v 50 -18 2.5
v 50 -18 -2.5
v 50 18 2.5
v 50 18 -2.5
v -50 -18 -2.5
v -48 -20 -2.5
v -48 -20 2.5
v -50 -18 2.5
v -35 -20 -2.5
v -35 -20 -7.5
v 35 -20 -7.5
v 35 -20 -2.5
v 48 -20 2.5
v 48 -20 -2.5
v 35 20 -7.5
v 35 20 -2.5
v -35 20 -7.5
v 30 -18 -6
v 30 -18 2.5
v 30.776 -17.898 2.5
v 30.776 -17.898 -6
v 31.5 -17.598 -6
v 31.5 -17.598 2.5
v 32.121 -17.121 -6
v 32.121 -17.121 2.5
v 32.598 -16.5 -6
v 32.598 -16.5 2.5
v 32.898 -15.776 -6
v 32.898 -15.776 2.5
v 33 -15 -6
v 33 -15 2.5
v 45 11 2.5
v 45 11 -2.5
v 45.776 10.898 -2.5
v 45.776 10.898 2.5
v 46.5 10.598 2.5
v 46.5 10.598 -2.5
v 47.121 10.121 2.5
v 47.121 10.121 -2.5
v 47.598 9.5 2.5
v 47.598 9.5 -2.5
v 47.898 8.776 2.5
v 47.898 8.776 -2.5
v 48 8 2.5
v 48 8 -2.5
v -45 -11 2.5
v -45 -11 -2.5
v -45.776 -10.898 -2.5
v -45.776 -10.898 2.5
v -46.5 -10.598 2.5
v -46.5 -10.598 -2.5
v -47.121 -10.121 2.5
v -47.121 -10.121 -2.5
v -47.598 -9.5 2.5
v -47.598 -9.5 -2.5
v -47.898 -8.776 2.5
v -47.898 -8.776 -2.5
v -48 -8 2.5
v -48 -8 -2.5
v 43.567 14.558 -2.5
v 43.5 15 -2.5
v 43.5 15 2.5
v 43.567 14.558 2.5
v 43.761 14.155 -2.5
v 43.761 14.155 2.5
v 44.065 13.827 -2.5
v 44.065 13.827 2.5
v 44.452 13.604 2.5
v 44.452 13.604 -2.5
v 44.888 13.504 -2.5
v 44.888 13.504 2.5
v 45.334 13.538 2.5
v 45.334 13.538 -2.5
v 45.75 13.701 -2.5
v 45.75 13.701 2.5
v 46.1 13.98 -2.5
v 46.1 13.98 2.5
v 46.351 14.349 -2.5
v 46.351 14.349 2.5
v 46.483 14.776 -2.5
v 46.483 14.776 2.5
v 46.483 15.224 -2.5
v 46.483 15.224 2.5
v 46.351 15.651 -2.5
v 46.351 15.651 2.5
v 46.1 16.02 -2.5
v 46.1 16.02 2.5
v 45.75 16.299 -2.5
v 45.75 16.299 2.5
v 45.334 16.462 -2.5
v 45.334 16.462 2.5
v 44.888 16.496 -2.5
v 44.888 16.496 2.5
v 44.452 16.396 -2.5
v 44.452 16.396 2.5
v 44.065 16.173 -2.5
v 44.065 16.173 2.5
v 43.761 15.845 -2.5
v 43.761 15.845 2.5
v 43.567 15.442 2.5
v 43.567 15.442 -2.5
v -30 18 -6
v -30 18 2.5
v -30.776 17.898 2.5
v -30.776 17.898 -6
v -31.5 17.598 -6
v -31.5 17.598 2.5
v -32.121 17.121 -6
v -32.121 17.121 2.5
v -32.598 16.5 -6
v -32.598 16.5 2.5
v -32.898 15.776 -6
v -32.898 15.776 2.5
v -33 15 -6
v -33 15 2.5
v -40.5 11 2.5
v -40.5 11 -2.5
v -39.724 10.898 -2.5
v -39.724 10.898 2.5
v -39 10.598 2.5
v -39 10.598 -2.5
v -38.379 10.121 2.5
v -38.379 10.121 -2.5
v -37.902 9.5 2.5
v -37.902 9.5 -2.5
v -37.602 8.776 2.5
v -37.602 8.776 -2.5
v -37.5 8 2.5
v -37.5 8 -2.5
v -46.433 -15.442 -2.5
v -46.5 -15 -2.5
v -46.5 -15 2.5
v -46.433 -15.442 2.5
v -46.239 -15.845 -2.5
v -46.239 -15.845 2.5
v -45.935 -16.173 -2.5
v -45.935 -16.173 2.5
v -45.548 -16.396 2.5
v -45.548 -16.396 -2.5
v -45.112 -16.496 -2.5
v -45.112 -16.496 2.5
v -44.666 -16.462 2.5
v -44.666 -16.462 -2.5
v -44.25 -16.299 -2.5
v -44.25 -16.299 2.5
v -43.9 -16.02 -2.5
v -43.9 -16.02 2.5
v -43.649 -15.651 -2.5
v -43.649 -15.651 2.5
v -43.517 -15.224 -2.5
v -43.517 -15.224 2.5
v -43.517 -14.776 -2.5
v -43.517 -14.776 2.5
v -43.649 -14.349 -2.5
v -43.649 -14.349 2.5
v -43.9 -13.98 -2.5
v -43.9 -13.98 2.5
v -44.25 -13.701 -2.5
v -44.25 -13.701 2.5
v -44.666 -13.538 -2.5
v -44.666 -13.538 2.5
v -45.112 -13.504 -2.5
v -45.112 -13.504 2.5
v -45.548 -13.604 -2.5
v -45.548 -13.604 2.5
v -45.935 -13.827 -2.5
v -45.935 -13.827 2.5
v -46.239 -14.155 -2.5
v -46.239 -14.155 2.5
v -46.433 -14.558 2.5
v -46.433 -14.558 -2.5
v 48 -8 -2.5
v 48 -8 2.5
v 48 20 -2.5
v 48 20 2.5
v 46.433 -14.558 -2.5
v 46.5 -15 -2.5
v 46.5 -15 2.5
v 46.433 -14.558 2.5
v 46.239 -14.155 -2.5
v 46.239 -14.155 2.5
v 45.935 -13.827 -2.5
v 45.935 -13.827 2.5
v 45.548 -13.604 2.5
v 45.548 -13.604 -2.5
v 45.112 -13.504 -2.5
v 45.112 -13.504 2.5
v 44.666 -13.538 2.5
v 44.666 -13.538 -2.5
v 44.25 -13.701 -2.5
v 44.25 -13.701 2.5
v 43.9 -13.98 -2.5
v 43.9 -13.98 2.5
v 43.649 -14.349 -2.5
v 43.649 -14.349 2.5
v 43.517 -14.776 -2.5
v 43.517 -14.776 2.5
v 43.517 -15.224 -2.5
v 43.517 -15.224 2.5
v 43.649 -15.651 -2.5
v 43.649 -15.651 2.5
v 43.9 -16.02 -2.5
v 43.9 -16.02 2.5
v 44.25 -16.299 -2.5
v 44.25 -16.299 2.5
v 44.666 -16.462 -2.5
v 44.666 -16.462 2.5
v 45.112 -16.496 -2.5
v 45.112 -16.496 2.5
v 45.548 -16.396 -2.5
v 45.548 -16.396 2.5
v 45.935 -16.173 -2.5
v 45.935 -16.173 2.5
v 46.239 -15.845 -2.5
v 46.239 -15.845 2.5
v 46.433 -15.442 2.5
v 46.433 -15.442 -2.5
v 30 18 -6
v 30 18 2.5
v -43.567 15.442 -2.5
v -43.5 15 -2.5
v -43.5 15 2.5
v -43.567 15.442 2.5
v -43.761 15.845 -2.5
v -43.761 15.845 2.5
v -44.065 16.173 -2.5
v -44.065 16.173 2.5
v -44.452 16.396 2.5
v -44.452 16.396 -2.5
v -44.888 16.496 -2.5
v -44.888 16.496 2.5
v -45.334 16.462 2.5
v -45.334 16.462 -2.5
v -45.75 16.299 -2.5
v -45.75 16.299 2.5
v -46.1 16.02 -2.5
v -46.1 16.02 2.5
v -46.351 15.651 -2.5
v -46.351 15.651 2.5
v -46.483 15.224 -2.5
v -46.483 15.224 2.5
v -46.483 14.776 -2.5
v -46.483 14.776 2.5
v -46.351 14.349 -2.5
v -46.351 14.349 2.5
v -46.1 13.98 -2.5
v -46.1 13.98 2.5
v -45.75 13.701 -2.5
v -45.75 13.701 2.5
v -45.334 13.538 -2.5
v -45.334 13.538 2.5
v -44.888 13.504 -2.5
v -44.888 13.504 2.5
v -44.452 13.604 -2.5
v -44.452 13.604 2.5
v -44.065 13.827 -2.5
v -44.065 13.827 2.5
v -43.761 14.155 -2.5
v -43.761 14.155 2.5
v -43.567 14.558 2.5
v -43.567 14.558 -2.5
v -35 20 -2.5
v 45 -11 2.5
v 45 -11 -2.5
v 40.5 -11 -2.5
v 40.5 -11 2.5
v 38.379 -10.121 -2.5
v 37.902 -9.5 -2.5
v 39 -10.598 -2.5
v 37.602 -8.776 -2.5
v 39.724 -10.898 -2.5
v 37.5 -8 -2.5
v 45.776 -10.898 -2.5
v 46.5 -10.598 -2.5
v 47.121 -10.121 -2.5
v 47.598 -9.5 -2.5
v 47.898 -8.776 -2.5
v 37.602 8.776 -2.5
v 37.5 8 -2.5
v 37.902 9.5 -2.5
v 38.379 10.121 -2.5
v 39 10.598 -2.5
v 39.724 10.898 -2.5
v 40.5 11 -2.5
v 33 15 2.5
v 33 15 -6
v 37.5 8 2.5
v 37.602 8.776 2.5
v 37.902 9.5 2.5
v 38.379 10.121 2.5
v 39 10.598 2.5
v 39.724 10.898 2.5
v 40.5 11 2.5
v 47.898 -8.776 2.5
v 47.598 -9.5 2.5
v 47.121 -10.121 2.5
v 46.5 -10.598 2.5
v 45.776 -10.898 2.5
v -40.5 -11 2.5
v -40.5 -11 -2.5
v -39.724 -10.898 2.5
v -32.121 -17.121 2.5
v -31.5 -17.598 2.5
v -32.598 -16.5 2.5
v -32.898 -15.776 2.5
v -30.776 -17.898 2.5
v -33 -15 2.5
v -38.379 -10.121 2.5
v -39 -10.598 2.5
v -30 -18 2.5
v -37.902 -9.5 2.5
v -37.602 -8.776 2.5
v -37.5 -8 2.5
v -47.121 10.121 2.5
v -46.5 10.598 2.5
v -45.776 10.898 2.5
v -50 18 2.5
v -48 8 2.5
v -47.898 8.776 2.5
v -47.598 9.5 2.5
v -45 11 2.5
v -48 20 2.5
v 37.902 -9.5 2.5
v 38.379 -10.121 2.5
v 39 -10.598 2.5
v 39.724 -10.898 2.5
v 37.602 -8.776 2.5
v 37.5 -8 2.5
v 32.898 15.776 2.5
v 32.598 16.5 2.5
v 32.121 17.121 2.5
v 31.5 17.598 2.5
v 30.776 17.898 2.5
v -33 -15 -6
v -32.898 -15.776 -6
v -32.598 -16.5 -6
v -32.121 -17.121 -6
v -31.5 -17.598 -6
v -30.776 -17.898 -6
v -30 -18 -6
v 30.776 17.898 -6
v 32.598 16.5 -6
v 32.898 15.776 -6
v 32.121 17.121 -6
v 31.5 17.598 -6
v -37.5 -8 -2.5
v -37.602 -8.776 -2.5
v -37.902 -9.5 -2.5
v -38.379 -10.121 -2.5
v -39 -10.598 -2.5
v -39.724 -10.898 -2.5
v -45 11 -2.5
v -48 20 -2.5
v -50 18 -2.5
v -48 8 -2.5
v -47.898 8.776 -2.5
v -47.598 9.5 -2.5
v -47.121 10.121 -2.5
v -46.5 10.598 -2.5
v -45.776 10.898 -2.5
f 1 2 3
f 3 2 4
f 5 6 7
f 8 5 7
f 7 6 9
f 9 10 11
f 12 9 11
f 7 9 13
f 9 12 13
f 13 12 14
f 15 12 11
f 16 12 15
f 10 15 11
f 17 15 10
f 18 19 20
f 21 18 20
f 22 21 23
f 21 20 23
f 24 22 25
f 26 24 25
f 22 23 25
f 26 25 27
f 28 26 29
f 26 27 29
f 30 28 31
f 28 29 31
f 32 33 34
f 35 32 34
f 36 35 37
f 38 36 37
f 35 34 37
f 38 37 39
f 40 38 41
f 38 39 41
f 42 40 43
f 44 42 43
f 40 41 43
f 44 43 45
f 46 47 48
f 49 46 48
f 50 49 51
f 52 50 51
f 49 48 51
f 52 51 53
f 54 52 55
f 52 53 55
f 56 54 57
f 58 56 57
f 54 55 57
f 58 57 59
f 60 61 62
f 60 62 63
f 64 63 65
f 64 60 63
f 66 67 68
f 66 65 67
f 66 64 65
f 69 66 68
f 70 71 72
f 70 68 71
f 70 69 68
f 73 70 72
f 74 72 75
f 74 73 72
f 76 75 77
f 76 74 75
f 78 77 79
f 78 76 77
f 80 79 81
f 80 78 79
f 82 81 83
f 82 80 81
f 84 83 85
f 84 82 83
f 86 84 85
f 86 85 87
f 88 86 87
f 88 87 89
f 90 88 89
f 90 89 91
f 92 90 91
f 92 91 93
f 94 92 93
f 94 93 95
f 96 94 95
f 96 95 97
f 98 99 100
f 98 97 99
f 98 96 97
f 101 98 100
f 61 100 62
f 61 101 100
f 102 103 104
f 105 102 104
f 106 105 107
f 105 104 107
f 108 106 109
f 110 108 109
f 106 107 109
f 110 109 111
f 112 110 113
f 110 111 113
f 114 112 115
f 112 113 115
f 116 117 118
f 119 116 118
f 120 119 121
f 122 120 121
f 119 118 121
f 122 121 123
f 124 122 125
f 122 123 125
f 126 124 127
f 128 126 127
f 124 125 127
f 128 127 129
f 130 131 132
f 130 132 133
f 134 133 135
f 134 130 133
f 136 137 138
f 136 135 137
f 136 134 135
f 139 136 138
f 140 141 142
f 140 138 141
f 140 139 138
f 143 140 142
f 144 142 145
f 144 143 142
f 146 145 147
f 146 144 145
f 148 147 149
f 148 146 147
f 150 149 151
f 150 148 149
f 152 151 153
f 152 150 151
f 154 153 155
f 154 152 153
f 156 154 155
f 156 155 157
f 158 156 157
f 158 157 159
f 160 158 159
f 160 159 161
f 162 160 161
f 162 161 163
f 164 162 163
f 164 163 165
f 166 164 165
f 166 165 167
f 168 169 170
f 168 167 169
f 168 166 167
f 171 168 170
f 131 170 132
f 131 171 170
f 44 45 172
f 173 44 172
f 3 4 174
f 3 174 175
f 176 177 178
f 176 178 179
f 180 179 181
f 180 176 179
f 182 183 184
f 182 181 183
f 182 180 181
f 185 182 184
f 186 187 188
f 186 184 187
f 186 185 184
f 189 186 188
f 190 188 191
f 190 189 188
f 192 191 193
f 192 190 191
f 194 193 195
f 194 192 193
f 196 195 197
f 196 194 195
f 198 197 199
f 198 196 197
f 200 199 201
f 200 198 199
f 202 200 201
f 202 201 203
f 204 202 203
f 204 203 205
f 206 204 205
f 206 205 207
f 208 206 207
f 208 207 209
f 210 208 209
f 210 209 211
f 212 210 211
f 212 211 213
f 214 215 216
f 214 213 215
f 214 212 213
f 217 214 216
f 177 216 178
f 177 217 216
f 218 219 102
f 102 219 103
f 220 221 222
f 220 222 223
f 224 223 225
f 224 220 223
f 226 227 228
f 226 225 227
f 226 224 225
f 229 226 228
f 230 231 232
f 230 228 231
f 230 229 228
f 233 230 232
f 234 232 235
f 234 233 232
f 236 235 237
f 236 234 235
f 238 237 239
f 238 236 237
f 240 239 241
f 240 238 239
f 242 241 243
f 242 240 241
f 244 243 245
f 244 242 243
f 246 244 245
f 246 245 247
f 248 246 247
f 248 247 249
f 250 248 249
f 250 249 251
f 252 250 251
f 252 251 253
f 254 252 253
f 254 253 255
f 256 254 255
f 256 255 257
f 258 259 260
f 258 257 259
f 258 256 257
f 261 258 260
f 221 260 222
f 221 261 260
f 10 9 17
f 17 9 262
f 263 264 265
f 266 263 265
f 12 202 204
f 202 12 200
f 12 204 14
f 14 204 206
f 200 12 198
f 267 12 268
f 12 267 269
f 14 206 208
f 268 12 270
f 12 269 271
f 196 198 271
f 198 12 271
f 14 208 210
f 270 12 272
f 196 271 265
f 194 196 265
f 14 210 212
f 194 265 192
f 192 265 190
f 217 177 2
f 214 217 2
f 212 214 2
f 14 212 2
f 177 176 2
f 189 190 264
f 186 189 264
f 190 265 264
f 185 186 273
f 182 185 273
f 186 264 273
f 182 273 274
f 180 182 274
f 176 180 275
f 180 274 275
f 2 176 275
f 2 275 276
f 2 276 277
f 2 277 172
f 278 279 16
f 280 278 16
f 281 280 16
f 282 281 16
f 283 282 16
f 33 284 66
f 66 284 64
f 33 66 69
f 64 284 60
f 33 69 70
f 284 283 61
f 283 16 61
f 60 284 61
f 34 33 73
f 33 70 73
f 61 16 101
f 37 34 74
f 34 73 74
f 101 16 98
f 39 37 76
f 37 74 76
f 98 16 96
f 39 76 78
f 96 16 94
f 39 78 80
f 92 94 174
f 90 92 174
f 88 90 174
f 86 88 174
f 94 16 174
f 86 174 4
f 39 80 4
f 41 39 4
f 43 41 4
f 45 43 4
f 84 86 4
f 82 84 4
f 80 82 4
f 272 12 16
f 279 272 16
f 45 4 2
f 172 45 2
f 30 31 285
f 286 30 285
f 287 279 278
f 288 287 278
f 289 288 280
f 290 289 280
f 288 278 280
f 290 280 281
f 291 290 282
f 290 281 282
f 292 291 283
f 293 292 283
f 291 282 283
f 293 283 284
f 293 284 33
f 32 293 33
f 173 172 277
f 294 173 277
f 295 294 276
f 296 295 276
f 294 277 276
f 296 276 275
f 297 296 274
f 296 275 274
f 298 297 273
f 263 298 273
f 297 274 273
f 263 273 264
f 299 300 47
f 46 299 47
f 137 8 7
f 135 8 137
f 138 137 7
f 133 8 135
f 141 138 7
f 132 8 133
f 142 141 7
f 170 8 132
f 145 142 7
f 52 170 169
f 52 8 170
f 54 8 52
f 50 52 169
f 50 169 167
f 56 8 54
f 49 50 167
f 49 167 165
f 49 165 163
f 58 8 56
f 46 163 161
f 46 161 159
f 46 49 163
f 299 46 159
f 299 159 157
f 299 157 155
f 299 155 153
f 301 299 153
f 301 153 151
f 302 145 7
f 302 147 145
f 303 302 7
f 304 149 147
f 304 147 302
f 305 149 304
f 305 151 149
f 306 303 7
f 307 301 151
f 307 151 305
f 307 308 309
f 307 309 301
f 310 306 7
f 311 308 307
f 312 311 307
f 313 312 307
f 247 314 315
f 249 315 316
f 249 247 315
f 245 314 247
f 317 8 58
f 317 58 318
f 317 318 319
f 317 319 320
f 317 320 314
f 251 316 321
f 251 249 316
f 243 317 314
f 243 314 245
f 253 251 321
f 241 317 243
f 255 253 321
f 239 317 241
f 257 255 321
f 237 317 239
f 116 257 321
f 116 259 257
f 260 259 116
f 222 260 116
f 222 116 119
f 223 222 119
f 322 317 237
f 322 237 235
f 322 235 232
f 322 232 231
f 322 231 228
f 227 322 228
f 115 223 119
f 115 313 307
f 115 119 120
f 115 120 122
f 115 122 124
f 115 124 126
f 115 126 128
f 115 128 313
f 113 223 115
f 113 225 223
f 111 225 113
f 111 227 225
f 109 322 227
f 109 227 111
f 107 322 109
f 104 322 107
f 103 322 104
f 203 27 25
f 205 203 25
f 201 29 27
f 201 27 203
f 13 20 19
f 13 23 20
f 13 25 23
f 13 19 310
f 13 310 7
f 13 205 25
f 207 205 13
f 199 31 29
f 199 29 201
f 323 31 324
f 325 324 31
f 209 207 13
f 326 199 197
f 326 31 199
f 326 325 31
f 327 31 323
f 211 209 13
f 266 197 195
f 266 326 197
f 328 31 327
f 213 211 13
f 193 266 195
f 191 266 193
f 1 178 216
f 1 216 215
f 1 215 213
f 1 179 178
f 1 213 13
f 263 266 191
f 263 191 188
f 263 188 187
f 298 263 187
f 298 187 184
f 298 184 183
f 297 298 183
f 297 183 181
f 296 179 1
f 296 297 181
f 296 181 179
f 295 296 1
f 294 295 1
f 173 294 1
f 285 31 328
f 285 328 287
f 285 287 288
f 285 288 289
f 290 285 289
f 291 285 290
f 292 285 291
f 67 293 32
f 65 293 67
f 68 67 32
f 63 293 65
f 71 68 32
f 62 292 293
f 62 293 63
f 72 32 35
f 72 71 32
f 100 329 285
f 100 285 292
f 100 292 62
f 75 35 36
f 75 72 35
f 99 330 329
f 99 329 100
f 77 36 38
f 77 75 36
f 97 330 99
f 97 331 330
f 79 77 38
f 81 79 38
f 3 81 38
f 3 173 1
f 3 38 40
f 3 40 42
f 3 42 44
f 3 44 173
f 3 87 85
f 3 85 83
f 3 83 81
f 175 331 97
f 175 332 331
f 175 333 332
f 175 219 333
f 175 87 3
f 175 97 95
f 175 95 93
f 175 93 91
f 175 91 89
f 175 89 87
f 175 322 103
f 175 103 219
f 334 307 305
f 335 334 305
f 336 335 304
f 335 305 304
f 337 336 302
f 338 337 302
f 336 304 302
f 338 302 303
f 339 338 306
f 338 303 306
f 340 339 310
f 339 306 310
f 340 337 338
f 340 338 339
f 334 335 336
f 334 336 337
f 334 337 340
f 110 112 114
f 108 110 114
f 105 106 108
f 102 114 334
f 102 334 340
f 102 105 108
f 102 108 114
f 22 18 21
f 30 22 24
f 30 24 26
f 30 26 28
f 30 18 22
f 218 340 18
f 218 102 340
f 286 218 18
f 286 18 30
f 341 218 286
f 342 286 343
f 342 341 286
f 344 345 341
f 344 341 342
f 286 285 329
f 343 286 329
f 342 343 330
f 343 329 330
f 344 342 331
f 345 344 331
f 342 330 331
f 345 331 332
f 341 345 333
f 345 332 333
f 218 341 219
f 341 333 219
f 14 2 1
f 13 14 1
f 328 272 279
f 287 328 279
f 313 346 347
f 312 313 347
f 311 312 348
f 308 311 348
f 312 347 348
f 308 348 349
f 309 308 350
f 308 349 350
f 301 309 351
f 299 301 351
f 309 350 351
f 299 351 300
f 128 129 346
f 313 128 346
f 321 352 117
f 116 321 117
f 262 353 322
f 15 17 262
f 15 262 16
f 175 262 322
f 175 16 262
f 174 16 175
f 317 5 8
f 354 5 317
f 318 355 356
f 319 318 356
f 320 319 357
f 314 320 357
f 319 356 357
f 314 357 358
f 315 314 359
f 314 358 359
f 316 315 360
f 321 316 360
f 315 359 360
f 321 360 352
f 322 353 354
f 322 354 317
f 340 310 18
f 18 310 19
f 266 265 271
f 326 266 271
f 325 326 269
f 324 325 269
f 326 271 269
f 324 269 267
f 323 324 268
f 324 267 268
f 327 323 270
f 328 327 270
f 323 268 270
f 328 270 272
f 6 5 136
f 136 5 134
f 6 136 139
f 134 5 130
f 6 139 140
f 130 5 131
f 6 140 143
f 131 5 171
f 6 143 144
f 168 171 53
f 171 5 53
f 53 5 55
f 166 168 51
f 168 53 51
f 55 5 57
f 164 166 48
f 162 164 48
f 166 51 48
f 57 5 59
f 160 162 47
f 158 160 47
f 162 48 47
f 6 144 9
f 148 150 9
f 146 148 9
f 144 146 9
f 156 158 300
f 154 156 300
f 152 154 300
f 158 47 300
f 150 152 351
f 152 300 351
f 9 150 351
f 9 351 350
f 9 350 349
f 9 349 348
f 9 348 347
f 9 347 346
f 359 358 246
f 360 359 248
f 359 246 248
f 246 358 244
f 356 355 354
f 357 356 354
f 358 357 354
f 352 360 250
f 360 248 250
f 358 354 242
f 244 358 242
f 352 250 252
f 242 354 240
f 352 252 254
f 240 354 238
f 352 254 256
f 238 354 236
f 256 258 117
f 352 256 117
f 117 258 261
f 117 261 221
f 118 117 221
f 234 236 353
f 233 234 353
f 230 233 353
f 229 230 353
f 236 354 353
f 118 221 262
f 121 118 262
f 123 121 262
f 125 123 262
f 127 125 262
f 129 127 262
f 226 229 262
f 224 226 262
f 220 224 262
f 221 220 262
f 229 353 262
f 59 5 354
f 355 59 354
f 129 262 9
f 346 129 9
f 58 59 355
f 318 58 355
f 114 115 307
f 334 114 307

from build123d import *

# Parameters (mm, degrees)
AUFSATZ_LINEAR_AUSTRAGEN1_DEPTH      = 2.5
AUFSATZ_LINEAR_AUSTRAGEN1_DEPTH_BACK = 2.5
SKIZZE1_W                            = 100
SKIZZE1_H                            = 40
SCHNITT_LINEAR_AUSTRAGEN1_DEPTH      = 54.909646632
SCHNITT_LINEAR_AUSTRAGEN1_DEPTH_BACK = 54.909646632
SKIZZE2_R                            = 1.5
SCHNITT_LINEAR_AUSTRAGEN2_DEPTH      = 54.909646632
SCHNITT_LINEAR_AUSTRAGEN2_DEPTH_BACK = 54.909646632
SKIZZE7_W                            = 70
SKIZZE7_H                            = 40
AUFSATZ_LINEAR_AUSTRAGEN3_DEPTH      = 5
SCHNITT_LINEAR_AUSTRAGEN6_DEPTH      = 8.5
FASE1_SIZE                           = 2


with BuildPart() as part:
    # Skizze1 → Aufsatz-Linear austragen1 (new, two sides: drawn at the far end of the back side and taken through both)
    with BuildSketch(Plane.XY.offset(-AUFSATZ_LINEAR_AUSTRAGEN1_DEPTH_BACK)):
        Rectangle(SKIZZE1_W, SKIZZE1_H)
    extrude(amount=AUFSATZ_LINEAR_AUSTRAGEN1_DEPTH + AUFSATZ_LINEAR_AUSTRAGEN1_DEPTH_BACK)

    # Skizze2 → Schnitt-Linear austragen1 (cut, two sides: drawn at the far end of the back side and taken through both)
    with BuildSketch(Plane.XY.offset(-SCHNITT_LINEAR_AUSTRAGEN1_DEPTH_BACK)):
        with Locations((-45, 15)):
            Circle(SKIZZE2_R)
        with Locations(Location((-45, -15, 0), (0, 0, 180))):
            Circle(SKIZZE2_R)
        with Locations((45, -15)):
            Circle(SKIZZE2_R)
        with Locations(Location((45, 15, 0), (0, 0, 180))):
            Circle(SKIZZE2_R)
    extrude(amount=SCHNITT_LINEAR_AUSTRAGEN1_DEPTH + SCHNITT_LINEAR_AUSTRAGEN1_DEPTH_BACK, mode=Mode.SUBTRACT)

    # Skizze4 → Schnitt-Linear austragen2 (cut, two sides: drawn at the far end of the back side and taken through both)
    with BuildSketch(Plane.XY.offset(-SCHNITT_LINEAR_AUSTRAGEN2_DEPTH_BACK)):
        with BuildLine():
            Line((-48, -8), (-48, 8))
            ThreePointArc((-48, 8), (-47.121320344, 10.121320344), (-45, 11))
            Line((-45, 11), (-40.5, 11))
            ThreePointArc((-40.5, 11), (-38.378679656, 10.121320344), (-37.5, 8))
            Line((-37.5, 8), (-37.5, -8))
            ThreePointArc((-37.5, -8), (-38.378679656, -10.121320344), (-40.5, -11))
            Line((-40.5, -11), (-45, -11))
            ThreePointArc((-45, -11), (-47.121320344, -10.121320344), (-48, -8))
        make_face()
        with BuildLine():
            Line((45, -11), (40.5, -11))
            ThreePointArc((40.5, -11), (38.378679656, -10.121320344), (37.5, -8))
            Line((37.5, -8), (37.5, 8))
            ThreePointArc((37.5, 8), (38.378679656, 10.121320344), (40.5, 11))
            Line((40.5, 11), (45, 11))
            ThreePointArc((45, 11), (47.121320344, 10.121320344), (48, 8))
            Line((48, 8), (48, -8))
            ThreePointArc((48, -8), (47.121320344, -10.121320344), (45, -11))
        make_face()
    extrude(amount=SCHNITT_LINEAR_AUSTRAGEN2_DEPTH + SCHNITT_LINEAR_AUSTRAGEN2_DEPTH_BACK, mode=Mode.SUBTRACT)

    # Skizze7 → Aufsatz-Linear austragen3 (add)
    with BuildSketch(Plane(origin=(0, 0, -2.5), x_dir=(-1, 0, 0), z_dir=(0, 0, -1))):
        Rectangle(SKIZZE7_W, SKIZZE7_H)
    extrude(amount=AUFSATZ_LINEAR_AUSTRAGEN3_DEPTH)

    # Skizze8 → Schnitt-Linear austragen6 (cut)
    with BuildSketch(Plane.XY.offset(2.5)):
        with BuildLine():
            Line((33, -15), (33, 15))
            ThreePointArc((33, 15), (32.121320344, 17.121320344), (30, 18))
            Line((30, 18), (-30, 18))
            ThreePointArc((-30, 18), (-32.121320344, 17.121320344), (-33, 15))
            Line((-33, 15), (-33, -15))
            ThreePointArc((-33, -15), (-32.121320344, -17.121320344), (-30, -18))
            Line((-30, -18), (30, -18))
            ThreePointArc((30, -18), (32.121320344, -17.121320344), (33, -15))
        make_face()
    extrude(amount=-SCHNITT_LINEAR_AUSTRAGEN6_DEPTH, mode=Mode.SUBTRACT)

    # Fase1
    fase1_edges = [part.edges().sort_by_distance(p)[0] for p in [
        (50, 20, 0),
        (50, -20, 0),
        (-50, -20, 0),
        (-50, 20, 0),
    ]]
    chamfer(fase1_edges, length=FASE1_SIZE)


solid = part.part
